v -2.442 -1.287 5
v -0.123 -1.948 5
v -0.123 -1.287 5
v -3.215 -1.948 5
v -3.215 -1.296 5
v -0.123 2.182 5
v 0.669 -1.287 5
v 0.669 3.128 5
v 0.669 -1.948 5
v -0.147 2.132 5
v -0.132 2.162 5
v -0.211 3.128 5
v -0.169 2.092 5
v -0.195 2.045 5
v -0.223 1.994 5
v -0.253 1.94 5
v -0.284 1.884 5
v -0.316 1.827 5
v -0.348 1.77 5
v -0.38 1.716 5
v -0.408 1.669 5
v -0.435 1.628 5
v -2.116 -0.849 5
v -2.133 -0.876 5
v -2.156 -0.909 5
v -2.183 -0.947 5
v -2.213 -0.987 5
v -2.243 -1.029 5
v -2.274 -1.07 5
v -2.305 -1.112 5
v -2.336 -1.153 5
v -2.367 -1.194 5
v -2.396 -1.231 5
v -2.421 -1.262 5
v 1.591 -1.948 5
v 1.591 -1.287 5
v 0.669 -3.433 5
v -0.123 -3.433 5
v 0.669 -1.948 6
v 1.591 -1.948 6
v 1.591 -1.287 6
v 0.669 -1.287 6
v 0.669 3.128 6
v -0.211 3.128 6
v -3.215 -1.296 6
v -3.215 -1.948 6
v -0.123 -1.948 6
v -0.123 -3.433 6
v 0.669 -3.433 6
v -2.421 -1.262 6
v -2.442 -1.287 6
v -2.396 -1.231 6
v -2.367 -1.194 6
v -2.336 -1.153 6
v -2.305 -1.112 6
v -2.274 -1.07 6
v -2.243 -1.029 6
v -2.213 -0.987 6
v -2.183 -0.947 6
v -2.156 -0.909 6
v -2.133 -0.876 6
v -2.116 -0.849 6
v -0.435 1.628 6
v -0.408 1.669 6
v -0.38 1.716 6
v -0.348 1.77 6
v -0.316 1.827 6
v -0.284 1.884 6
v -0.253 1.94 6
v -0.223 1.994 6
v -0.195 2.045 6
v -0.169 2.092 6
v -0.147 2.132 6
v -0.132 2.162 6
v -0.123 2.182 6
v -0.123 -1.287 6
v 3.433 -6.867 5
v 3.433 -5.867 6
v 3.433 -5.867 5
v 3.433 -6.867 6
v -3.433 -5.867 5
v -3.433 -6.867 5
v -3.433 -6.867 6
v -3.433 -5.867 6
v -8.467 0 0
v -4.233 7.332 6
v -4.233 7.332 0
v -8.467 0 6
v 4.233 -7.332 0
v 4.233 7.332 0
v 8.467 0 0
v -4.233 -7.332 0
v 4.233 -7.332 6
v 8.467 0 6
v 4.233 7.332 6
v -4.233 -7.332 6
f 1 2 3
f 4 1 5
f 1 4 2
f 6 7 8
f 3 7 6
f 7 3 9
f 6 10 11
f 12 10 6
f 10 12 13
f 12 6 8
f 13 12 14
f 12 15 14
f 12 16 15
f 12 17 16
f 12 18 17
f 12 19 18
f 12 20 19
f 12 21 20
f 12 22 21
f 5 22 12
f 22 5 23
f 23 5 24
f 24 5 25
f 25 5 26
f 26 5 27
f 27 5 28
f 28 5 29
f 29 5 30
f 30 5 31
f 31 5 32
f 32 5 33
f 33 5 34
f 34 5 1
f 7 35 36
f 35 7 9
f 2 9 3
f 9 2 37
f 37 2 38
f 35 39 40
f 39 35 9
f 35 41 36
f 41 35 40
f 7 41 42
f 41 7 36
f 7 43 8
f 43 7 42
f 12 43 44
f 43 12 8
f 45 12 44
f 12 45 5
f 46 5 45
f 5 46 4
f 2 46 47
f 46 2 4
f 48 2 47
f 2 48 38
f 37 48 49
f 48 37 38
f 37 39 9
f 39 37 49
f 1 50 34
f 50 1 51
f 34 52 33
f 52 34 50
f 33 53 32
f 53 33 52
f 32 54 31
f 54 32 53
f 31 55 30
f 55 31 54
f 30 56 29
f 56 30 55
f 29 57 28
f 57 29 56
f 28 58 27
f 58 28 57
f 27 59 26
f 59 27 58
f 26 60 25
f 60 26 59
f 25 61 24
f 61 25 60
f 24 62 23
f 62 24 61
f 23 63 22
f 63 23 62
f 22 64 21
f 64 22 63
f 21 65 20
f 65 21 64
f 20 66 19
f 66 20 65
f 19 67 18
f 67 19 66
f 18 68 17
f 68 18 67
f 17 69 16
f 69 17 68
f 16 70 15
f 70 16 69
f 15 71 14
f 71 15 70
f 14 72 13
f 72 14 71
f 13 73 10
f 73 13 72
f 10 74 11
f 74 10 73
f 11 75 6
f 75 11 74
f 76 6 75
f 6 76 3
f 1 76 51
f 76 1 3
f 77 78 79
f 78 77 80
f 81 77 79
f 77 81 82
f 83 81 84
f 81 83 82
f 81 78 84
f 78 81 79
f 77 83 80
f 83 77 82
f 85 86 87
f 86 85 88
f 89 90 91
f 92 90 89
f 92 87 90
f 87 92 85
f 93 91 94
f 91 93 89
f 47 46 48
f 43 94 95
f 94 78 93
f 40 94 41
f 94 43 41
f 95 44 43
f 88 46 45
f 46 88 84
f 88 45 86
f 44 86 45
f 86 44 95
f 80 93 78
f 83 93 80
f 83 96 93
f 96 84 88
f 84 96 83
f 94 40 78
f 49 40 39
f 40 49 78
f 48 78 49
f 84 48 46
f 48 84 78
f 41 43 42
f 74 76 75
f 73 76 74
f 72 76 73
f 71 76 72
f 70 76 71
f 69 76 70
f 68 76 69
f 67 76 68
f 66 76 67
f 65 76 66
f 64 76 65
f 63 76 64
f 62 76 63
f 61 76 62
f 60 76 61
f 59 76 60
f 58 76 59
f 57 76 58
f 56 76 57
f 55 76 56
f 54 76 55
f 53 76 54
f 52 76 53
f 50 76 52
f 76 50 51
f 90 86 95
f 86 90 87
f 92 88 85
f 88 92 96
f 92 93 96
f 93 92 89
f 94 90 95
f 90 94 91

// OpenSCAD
// file: ../library/calculate.scad
module inlay(depth)
{
    difference()
    {
        children(0);
        translate([ 0, 0, depth ]) children([1:$children - 1]);
    }
}
// file: ../library/variables.scad
// Variables

die_width = 12;
double_digit_placement = 1; // 0.7 for 8mm, 1 for 12mm

wiggle_width = 0.2;
separator = 1.6;
base_plate_sides = 5;
token_sides = 6;
slot_height = 1;

// Calculations

height = die_width / 2;

die_slot_width = die_width + wiggle_width;
die_slot_y = -1 * ((die_slot_width / 2) + separator);
die_slot_right_x = (die_slot_width / 2) + separator;
die_slot_left_x = -1 * (die_slot_width / 2) - separator;

base_plate_size = (die_slot_width * 2) + separator;
inset_width = base_plate_size - separator;
inset_depth = height - separator;

shallow_slot_height = (height - inset_depth) / 2;

token_slot_width = base_plate_size / 3;
token_width = token_slot_width - wiggle_width;
token_height = height;
token_slot_y = (die_slot_width / 2) + (separator * 2);
token_inset_height = token_height - 1;
token_doubledigit_font_size = token_width - separator;

token_poison_width = (token_width / 3);
token_poison_placement = (token_width / 3);
// file: ../library/tokens.scad
include <variables.scad>
include <calculate.scad>

module token_base()
{
    linear_extrude(token_height) circle(token_width, $fn = token_sides);
}

module token_doubledigit_number(num) 
{
    inlay(depth = token_inset_height) 
    {
        token_base();
        translate([-1 * token_doubledigit_font_size + double_digit_placement, -1 * token_doubledigit_font_size / 2, 0]) linear_extrude(token_height) text(text = num, size = token_doubledigit_font_size);
        translate([-1 * token_doubledigit_font_size / 2, -1 * token_doubledigit_font_size, 0]) cube([token_doubledigit_font_size, 1, 2]);
    }
}

module token_singledigit_number(num) 
{ 
    inlay(depth = token_inset_height) 
    {
        token_base();
        translate([-1 * (token_doubledigit_font_size / 2), -1 * token_doubledigit_font_size / 2, 0]) linear_extrude(token_height) text(text = num, size = token_doubledigit_font_size);
        translate([-1 * token_doubledigit_font_size / 2, -1 * token_doubledigit_font_size, 0]) cube([token_doubledigit_font_size, 1, 2]);
    }
}
// main file
include <../library/tokens.scad>

token_singledigit_number("4");
